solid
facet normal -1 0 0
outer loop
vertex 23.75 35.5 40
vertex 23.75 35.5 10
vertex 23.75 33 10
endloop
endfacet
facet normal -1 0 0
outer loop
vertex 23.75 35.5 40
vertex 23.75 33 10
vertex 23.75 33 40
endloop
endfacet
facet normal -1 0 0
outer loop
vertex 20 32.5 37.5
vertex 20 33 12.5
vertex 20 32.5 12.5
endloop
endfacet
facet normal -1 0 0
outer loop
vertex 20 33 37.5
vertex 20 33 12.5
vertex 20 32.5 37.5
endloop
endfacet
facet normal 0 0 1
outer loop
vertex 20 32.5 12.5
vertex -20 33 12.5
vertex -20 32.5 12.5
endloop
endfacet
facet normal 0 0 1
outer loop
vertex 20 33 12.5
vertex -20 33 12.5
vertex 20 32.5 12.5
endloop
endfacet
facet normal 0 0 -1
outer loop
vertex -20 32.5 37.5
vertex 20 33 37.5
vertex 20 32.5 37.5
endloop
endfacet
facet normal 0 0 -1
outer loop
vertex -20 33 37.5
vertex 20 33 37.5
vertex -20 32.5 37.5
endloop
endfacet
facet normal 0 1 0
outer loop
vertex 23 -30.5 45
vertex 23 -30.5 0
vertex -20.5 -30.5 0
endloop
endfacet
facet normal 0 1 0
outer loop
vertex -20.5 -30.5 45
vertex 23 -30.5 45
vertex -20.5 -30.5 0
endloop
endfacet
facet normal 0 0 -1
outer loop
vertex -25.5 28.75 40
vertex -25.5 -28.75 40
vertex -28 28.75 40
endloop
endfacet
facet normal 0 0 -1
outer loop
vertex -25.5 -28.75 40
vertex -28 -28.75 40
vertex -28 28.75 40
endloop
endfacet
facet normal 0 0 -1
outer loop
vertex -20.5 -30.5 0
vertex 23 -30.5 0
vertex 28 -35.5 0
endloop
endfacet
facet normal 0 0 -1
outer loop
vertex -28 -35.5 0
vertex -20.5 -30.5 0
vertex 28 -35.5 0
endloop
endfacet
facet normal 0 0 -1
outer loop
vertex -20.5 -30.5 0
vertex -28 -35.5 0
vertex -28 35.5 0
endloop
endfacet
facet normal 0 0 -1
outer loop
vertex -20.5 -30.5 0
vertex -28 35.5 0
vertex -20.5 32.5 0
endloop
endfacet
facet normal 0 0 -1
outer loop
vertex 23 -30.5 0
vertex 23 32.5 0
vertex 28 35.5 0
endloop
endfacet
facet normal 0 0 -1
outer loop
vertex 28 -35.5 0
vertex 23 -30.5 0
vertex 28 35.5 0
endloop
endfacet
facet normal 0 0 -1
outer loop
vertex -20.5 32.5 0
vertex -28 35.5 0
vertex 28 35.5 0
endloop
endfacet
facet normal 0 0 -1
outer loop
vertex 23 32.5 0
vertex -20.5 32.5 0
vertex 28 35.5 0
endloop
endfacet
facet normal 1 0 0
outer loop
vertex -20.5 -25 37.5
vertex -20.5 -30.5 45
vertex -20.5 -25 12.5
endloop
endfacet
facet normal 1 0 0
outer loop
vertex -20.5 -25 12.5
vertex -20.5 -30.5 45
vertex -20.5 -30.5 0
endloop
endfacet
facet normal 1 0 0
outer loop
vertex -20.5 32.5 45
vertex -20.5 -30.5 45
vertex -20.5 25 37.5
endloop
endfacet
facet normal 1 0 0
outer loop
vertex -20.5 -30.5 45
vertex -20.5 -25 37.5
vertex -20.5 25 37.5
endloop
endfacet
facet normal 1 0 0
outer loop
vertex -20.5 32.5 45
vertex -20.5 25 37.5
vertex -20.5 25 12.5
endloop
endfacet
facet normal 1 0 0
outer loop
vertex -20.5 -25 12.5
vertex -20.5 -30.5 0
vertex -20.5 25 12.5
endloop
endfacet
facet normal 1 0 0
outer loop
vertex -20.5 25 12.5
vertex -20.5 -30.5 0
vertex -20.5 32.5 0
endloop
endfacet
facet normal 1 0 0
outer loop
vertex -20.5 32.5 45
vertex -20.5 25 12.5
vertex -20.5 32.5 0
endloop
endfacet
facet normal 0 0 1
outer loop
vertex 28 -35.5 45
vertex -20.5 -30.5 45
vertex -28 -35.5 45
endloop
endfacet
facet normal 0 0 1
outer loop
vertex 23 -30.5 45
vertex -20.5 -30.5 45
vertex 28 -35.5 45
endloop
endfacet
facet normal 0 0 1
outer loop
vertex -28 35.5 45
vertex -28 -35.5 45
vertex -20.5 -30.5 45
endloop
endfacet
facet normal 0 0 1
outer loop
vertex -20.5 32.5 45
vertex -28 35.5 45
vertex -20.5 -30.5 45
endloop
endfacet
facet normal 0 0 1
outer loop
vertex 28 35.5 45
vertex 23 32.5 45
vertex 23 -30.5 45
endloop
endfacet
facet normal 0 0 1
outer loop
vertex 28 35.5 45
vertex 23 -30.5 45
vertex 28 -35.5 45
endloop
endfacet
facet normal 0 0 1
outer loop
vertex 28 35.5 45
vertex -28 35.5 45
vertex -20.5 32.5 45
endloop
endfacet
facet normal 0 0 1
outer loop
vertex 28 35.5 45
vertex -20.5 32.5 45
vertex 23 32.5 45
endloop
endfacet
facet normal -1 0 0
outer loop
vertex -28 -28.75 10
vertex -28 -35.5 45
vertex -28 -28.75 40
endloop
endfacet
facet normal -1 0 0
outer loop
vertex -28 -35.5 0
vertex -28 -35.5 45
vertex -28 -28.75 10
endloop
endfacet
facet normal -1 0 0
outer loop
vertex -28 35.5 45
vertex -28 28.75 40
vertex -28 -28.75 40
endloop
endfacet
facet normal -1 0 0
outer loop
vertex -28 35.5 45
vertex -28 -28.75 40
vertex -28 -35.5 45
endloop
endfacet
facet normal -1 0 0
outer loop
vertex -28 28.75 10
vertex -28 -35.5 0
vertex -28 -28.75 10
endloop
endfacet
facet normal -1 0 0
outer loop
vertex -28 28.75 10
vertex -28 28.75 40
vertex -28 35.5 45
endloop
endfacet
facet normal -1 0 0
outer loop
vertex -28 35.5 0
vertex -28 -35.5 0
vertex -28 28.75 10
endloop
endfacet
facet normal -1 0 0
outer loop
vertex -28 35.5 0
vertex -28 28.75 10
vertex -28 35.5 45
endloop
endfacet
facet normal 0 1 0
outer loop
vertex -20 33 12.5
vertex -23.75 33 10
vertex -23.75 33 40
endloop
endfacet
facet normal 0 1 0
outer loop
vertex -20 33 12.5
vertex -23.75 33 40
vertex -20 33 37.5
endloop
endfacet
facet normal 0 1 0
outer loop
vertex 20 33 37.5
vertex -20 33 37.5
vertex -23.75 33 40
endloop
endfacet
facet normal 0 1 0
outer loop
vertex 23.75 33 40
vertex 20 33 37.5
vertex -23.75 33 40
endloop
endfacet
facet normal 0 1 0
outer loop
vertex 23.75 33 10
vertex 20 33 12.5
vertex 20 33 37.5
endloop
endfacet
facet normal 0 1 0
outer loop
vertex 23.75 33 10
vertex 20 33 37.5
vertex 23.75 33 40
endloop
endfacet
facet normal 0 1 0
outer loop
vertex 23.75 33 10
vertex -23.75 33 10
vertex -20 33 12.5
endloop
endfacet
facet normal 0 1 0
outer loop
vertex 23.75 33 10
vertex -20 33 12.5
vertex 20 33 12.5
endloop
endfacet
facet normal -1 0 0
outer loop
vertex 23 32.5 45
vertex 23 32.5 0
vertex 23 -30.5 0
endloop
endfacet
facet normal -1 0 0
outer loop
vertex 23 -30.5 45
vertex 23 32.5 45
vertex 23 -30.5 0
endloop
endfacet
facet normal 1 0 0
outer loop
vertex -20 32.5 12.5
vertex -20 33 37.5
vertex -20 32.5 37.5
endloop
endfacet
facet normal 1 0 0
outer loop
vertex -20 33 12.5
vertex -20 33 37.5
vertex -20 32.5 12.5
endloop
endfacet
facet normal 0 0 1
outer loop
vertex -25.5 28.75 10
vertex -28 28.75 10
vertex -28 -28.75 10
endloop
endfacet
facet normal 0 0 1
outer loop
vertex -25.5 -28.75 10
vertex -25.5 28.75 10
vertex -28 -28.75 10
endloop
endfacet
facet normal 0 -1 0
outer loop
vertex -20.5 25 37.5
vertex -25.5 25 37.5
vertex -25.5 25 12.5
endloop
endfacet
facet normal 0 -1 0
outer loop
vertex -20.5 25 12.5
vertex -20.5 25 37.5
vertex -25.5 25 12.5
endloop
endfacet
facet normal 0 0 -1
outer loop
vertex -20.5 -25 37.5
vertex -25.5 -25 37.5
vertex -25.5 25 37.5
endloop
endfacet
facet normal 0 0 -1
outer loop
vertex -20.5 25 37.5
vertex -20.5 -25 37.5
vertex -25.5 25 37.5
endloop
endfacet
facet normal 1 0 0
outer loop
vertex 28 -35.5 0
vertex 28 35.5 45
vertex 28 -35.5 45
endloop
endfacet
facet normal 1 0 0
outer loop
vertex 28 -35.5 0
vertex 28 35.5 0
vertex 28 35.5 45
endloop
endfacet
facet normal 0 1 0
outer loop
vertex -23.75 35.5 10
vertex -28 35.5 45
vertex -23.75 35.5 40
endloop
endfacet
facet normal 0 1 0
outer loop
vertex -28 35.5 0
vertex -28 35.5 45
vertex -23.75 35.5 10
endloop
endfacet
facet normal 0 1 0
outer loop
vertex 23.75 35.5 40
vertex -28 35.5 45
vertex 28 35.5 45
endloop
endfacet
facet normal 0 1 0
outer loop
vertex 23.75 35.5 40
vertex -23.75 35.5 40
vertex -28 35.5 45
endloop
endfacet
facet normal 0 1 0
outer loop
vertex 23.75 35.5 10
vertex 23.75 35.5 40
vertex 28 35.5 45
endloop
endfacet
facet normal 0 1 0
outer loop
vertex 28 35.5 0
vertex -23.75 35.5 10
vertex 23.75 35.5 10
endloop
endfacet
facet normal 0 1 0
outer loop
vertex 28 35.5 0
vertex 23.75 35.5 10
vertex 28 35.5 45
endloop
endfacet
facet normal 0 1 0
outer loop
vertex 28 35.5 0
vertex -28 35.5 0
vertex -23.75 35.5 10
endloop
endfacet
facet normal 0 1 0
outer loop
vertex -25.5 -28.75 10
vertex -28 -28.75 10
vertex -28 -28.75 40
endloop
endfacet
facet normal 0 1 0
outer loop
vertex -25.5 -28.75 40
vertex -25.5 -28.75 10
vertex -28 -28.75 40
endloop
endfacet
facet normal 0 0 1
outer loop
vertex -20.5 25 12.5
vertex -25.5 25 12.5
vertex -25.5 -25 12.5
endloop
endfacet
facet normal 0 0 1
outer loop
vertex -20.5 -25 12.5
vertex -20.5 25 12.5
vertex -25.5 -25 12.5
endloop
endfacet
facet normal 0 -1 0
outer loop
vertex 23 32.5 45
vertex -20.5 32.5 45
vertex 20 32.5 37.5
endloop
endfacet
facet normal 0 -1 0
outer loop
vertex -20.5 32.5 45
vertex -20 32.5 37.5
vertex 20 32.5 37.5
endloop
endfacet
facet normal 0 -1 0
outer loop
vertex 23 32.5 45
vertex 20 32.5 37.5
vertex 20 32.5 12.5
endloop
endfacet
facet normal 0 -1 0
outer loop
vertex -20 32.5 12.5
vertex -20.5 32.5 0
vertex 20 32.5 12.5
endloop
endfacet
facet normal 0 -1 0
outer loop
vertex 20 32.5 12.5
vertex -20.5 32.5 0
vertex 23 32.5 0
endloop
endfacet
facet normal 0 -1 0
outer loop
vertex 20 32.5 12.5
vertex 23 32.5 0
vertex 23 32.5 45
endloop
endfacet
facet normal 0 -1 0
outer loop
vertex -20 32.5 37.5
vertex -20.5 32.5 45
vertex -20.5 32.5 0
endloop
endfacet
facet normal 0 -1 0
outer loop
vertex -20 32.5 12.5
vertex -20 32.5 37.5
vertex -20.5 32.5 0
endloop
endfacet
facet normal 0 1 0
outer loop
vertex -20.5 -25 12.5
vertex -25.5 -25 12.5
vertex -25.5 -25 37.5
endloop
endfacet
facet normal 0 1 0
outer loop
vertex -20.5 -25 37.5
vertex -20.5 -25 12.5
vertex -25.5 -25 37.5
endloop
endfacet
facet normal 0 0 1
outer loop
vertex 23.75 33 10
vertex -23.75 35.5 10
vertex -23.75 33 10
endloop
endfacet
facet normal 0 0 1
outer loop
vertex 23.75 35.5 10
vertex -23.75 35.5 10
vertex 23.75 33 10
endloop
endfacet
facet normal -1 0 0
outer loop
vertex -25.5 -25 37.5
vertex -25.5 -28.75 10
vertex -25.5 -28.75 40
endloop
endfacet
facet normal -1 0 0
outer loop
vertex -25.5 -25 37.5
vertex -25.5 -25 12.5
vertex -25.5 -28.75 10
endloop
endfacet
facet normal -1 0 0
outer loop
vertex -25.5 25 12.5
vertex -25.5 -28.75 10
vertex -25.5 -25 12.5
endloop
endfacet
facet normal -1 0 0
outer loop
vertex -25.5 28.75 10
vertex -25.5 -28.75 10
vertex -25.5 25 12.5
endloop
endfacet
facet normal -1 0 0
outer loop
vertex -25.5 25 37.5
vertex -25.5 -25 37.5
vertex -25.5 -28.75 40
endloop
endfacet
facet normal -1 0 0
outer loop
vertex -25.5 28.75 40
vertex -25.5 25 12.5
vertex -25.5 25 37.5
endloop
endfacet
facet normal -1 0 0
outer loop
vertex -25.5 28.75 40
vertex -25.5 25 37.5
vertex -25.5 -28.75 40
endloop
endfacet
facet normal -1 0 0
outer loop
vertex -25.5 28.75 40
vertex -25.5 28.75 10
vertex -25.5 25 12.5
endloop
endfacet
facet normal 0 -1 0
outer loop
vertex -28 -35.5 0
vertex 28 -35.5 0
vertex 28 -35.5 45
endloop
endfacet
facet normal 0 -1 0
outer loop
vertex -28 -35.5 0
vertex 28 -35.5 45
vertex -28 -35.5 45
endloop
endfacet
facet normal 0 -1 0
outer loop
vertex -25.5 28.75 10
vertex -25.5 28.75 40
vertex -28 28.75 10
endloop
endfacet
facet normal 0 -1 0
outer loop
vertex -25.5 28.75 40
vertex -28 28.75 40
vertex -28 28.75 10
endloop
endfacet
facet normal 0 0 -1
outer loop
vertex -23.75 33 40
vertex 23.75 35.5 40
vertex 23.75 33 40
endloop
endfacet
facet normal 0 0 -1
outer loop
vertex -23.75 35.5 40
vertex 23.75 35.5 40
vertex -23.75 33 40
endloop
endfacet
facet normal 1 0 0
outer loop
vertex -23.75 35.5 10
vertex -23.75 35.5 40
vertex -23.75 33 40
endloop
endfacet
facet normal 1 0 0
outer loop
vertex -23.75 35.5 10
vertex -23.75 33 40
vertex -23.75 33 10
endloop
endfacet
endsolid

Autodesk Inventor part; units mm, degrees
ref_plane "YZ Plane" through (0, 0, 0) normal (1, 0, 0) x (0, 1, 0)
ref_plane "XZ Plane" through (0, 0, 0) normal (0, 1, 0) x (-1, 0, 0)
ref_plane "XY Plane" through (0, 0, 0) normal (0, 0, 1) x (1, 0, 0)
sketch "Sketch1" plane through (0, 0, 0) normal (0, 0, 1) x (1, 0, 0)
  line L0 (-28, 35.5) -> (28, 35.5)
  line L1 (28, 35.5) -> (28, -35.5)
  line L2 (28, -35.5) -> (-28, -35.5)
  line L3 (-28, -35.5) -> (-28, 35.5)
  line L4 (-20.5, 32.5) -> (23, 32.5)
  line L5 (23, 32.5) -> (23, -30.5)
  line L6 (23, -30.5) -> (-20.5, -30.5)
  line L7 (-20.5, -30.5) -> (-20.5, 32.5)
  point P0 (0, 0)
  dimension "d0" = 56
  dimension "d1" = 28
  dimension "d2" = 71
  dimension "d3" = 35.5
  dimension "d4" = 3
  dimension "d5" = 7.5
  dimension "d7" = 5
  dimension "d8" = 5
extrude "Extrusion1" add sketch "Sketch1" along normal blind 45
sketch "Sketch2" plane through (-28, -35.5, 0) normal (-1, 0, 0) x (0, 0, 1)
  line L0 (37.5, 60.5) -> (12.5, 60.5)
  line L1 (12.5, 60.5) -> (12.5, 10.5)
  line L2 (12.5, 10.5) -> (37.5, 10.5)
  line L3 (37.5, 10.5) -> (37.5, 60.5)
  point P0 (0, 35.5)
  dimension "d11" = 50
  dimension "d12" = 25
  dimension "d13" = 25
  dimension "d14" = 12.5
extrude "Extrusion2" cut sketch "Sketch2" against normal up to surface (7.5 mm away)
sketch "Sketch4" plane through (-28, -35.5, 0) normal (-1, 0, 0) x (0, 0, 1)
  line L0 (40, 64.25) -> (10, 64.25)
  line L1 (10, 64.25) -> (10, 6.75)
  line L2 (10, 6.75) -> (40, 6.75)
  line L3 (40, 6.75) -> (40, 64.25)
  line L4 (0, 0) -> (0, 71) projected
  point P0 (0, 35.5)
  dimension "d23" = 57.5
  dimension "d24" = 30
  dimension "d25" = 28.75
  dimension "d26" = 10
extrude "Extrusion4" cut sketch "Sketch4" against normal blind 2.5
sketch "Sketch5" plane through (-28, 35.5, 0) normal (0, 1, 0) x (1, 0, 0)
  line L0 (51.75, -40) -> (4.25, -40)
  line L1 (4.25, -40) -> (4.25, -10)
  line L2 (4.25, -10) -> (51.75, -10)
  line L3 (51.75, -10) -> (51.75, -40)
  line L4 (0, 0) -> (56, 0) projected
  point P0 (28, 0)
  dimension "d29" = 10
  dimension "d30" = 30
  dimension "d31" = 47.5
  dimension "d32" = 23.75
extrude "Extrusion5" cut sketch "Sketch5" against normal blind 2.5
sketch "Sketch6" plane through (-28, 35.5, 0) normal (0, 1, 0) x (1, 0, 0)
  line L0 (48, -37.5) -> (8, -37.5)
  line L1 (8, -37.5) -> (8, -12.5)
  line L2 (8, -12.5) -> (48, -12.5)
  line L3 (48, -12.5) -> (48, -37.5)
  point P0 (28, 0)
  dimension "d35" = 40
  dimension "d36" = 20
  dimension "d37" = 25
  dimension "d38" = 12.5
extrude "Extrusion6" cut sketch "Sketch6" against normal up to surface (3 mm away)
ref_plane "Work Plane1" through (0, 0, 7.5) normal (0, 0, -1) x (-1, 0, 0)
sketch "Sketch8" plane through (0, 0, 7.5) normal (0, 0, -1) x (-1, 0, 0)
  line L0 (-42, 35.5) -> (-28, 35.5)
  line L1 (-28, 35.5) -> (-28, -35.5)
  line L2 (-28, -35.5) -> (-42, -35.5)
  line L3 (-42, -35.5) -> (-42, 35.5)
  line L4 (-28, -35.5) -> (28, -35.5)
  line L5 (28, -35.5) -> (28, -52)
  line L6 (28, -52) -> (-28, -52)
  line L7 (-28, -52) -> (-28, -35.5)
  line L8 (28, 35.5) -> (47, 35.5)
  line L9 (47, 35.5) -> (47, -35.5)
  line L10 (47, -35.5) -> (28, -35.5)
  line L11 (28, -35.5) -> (28, 35.5)
  line L12 (-28, 35.5) -> (28, 35.5) projected
  line L13 (28, -35.5) -> (-28, -35.5) projected
  line L14 (-28, -35.5) -> (-28, 35.5) projected
  line L15 (28, 35.5) -> (28, -35.5) projected
  point P0 (0, 0)
equation "\"d1\" = 0.5 * d0"
equation "\"d3\" = 0.5 * d2"
equation "\"d7\" = d8"
equation "\"d12\" = 0.5 * d11"
equation "\"d25\" = 0.5 * d23"
equation "\"d32\" = 0.5 * d31"
equation "\"d36\" = 0.5 * d35"
properties part number "sampleHolderEnclosure"
